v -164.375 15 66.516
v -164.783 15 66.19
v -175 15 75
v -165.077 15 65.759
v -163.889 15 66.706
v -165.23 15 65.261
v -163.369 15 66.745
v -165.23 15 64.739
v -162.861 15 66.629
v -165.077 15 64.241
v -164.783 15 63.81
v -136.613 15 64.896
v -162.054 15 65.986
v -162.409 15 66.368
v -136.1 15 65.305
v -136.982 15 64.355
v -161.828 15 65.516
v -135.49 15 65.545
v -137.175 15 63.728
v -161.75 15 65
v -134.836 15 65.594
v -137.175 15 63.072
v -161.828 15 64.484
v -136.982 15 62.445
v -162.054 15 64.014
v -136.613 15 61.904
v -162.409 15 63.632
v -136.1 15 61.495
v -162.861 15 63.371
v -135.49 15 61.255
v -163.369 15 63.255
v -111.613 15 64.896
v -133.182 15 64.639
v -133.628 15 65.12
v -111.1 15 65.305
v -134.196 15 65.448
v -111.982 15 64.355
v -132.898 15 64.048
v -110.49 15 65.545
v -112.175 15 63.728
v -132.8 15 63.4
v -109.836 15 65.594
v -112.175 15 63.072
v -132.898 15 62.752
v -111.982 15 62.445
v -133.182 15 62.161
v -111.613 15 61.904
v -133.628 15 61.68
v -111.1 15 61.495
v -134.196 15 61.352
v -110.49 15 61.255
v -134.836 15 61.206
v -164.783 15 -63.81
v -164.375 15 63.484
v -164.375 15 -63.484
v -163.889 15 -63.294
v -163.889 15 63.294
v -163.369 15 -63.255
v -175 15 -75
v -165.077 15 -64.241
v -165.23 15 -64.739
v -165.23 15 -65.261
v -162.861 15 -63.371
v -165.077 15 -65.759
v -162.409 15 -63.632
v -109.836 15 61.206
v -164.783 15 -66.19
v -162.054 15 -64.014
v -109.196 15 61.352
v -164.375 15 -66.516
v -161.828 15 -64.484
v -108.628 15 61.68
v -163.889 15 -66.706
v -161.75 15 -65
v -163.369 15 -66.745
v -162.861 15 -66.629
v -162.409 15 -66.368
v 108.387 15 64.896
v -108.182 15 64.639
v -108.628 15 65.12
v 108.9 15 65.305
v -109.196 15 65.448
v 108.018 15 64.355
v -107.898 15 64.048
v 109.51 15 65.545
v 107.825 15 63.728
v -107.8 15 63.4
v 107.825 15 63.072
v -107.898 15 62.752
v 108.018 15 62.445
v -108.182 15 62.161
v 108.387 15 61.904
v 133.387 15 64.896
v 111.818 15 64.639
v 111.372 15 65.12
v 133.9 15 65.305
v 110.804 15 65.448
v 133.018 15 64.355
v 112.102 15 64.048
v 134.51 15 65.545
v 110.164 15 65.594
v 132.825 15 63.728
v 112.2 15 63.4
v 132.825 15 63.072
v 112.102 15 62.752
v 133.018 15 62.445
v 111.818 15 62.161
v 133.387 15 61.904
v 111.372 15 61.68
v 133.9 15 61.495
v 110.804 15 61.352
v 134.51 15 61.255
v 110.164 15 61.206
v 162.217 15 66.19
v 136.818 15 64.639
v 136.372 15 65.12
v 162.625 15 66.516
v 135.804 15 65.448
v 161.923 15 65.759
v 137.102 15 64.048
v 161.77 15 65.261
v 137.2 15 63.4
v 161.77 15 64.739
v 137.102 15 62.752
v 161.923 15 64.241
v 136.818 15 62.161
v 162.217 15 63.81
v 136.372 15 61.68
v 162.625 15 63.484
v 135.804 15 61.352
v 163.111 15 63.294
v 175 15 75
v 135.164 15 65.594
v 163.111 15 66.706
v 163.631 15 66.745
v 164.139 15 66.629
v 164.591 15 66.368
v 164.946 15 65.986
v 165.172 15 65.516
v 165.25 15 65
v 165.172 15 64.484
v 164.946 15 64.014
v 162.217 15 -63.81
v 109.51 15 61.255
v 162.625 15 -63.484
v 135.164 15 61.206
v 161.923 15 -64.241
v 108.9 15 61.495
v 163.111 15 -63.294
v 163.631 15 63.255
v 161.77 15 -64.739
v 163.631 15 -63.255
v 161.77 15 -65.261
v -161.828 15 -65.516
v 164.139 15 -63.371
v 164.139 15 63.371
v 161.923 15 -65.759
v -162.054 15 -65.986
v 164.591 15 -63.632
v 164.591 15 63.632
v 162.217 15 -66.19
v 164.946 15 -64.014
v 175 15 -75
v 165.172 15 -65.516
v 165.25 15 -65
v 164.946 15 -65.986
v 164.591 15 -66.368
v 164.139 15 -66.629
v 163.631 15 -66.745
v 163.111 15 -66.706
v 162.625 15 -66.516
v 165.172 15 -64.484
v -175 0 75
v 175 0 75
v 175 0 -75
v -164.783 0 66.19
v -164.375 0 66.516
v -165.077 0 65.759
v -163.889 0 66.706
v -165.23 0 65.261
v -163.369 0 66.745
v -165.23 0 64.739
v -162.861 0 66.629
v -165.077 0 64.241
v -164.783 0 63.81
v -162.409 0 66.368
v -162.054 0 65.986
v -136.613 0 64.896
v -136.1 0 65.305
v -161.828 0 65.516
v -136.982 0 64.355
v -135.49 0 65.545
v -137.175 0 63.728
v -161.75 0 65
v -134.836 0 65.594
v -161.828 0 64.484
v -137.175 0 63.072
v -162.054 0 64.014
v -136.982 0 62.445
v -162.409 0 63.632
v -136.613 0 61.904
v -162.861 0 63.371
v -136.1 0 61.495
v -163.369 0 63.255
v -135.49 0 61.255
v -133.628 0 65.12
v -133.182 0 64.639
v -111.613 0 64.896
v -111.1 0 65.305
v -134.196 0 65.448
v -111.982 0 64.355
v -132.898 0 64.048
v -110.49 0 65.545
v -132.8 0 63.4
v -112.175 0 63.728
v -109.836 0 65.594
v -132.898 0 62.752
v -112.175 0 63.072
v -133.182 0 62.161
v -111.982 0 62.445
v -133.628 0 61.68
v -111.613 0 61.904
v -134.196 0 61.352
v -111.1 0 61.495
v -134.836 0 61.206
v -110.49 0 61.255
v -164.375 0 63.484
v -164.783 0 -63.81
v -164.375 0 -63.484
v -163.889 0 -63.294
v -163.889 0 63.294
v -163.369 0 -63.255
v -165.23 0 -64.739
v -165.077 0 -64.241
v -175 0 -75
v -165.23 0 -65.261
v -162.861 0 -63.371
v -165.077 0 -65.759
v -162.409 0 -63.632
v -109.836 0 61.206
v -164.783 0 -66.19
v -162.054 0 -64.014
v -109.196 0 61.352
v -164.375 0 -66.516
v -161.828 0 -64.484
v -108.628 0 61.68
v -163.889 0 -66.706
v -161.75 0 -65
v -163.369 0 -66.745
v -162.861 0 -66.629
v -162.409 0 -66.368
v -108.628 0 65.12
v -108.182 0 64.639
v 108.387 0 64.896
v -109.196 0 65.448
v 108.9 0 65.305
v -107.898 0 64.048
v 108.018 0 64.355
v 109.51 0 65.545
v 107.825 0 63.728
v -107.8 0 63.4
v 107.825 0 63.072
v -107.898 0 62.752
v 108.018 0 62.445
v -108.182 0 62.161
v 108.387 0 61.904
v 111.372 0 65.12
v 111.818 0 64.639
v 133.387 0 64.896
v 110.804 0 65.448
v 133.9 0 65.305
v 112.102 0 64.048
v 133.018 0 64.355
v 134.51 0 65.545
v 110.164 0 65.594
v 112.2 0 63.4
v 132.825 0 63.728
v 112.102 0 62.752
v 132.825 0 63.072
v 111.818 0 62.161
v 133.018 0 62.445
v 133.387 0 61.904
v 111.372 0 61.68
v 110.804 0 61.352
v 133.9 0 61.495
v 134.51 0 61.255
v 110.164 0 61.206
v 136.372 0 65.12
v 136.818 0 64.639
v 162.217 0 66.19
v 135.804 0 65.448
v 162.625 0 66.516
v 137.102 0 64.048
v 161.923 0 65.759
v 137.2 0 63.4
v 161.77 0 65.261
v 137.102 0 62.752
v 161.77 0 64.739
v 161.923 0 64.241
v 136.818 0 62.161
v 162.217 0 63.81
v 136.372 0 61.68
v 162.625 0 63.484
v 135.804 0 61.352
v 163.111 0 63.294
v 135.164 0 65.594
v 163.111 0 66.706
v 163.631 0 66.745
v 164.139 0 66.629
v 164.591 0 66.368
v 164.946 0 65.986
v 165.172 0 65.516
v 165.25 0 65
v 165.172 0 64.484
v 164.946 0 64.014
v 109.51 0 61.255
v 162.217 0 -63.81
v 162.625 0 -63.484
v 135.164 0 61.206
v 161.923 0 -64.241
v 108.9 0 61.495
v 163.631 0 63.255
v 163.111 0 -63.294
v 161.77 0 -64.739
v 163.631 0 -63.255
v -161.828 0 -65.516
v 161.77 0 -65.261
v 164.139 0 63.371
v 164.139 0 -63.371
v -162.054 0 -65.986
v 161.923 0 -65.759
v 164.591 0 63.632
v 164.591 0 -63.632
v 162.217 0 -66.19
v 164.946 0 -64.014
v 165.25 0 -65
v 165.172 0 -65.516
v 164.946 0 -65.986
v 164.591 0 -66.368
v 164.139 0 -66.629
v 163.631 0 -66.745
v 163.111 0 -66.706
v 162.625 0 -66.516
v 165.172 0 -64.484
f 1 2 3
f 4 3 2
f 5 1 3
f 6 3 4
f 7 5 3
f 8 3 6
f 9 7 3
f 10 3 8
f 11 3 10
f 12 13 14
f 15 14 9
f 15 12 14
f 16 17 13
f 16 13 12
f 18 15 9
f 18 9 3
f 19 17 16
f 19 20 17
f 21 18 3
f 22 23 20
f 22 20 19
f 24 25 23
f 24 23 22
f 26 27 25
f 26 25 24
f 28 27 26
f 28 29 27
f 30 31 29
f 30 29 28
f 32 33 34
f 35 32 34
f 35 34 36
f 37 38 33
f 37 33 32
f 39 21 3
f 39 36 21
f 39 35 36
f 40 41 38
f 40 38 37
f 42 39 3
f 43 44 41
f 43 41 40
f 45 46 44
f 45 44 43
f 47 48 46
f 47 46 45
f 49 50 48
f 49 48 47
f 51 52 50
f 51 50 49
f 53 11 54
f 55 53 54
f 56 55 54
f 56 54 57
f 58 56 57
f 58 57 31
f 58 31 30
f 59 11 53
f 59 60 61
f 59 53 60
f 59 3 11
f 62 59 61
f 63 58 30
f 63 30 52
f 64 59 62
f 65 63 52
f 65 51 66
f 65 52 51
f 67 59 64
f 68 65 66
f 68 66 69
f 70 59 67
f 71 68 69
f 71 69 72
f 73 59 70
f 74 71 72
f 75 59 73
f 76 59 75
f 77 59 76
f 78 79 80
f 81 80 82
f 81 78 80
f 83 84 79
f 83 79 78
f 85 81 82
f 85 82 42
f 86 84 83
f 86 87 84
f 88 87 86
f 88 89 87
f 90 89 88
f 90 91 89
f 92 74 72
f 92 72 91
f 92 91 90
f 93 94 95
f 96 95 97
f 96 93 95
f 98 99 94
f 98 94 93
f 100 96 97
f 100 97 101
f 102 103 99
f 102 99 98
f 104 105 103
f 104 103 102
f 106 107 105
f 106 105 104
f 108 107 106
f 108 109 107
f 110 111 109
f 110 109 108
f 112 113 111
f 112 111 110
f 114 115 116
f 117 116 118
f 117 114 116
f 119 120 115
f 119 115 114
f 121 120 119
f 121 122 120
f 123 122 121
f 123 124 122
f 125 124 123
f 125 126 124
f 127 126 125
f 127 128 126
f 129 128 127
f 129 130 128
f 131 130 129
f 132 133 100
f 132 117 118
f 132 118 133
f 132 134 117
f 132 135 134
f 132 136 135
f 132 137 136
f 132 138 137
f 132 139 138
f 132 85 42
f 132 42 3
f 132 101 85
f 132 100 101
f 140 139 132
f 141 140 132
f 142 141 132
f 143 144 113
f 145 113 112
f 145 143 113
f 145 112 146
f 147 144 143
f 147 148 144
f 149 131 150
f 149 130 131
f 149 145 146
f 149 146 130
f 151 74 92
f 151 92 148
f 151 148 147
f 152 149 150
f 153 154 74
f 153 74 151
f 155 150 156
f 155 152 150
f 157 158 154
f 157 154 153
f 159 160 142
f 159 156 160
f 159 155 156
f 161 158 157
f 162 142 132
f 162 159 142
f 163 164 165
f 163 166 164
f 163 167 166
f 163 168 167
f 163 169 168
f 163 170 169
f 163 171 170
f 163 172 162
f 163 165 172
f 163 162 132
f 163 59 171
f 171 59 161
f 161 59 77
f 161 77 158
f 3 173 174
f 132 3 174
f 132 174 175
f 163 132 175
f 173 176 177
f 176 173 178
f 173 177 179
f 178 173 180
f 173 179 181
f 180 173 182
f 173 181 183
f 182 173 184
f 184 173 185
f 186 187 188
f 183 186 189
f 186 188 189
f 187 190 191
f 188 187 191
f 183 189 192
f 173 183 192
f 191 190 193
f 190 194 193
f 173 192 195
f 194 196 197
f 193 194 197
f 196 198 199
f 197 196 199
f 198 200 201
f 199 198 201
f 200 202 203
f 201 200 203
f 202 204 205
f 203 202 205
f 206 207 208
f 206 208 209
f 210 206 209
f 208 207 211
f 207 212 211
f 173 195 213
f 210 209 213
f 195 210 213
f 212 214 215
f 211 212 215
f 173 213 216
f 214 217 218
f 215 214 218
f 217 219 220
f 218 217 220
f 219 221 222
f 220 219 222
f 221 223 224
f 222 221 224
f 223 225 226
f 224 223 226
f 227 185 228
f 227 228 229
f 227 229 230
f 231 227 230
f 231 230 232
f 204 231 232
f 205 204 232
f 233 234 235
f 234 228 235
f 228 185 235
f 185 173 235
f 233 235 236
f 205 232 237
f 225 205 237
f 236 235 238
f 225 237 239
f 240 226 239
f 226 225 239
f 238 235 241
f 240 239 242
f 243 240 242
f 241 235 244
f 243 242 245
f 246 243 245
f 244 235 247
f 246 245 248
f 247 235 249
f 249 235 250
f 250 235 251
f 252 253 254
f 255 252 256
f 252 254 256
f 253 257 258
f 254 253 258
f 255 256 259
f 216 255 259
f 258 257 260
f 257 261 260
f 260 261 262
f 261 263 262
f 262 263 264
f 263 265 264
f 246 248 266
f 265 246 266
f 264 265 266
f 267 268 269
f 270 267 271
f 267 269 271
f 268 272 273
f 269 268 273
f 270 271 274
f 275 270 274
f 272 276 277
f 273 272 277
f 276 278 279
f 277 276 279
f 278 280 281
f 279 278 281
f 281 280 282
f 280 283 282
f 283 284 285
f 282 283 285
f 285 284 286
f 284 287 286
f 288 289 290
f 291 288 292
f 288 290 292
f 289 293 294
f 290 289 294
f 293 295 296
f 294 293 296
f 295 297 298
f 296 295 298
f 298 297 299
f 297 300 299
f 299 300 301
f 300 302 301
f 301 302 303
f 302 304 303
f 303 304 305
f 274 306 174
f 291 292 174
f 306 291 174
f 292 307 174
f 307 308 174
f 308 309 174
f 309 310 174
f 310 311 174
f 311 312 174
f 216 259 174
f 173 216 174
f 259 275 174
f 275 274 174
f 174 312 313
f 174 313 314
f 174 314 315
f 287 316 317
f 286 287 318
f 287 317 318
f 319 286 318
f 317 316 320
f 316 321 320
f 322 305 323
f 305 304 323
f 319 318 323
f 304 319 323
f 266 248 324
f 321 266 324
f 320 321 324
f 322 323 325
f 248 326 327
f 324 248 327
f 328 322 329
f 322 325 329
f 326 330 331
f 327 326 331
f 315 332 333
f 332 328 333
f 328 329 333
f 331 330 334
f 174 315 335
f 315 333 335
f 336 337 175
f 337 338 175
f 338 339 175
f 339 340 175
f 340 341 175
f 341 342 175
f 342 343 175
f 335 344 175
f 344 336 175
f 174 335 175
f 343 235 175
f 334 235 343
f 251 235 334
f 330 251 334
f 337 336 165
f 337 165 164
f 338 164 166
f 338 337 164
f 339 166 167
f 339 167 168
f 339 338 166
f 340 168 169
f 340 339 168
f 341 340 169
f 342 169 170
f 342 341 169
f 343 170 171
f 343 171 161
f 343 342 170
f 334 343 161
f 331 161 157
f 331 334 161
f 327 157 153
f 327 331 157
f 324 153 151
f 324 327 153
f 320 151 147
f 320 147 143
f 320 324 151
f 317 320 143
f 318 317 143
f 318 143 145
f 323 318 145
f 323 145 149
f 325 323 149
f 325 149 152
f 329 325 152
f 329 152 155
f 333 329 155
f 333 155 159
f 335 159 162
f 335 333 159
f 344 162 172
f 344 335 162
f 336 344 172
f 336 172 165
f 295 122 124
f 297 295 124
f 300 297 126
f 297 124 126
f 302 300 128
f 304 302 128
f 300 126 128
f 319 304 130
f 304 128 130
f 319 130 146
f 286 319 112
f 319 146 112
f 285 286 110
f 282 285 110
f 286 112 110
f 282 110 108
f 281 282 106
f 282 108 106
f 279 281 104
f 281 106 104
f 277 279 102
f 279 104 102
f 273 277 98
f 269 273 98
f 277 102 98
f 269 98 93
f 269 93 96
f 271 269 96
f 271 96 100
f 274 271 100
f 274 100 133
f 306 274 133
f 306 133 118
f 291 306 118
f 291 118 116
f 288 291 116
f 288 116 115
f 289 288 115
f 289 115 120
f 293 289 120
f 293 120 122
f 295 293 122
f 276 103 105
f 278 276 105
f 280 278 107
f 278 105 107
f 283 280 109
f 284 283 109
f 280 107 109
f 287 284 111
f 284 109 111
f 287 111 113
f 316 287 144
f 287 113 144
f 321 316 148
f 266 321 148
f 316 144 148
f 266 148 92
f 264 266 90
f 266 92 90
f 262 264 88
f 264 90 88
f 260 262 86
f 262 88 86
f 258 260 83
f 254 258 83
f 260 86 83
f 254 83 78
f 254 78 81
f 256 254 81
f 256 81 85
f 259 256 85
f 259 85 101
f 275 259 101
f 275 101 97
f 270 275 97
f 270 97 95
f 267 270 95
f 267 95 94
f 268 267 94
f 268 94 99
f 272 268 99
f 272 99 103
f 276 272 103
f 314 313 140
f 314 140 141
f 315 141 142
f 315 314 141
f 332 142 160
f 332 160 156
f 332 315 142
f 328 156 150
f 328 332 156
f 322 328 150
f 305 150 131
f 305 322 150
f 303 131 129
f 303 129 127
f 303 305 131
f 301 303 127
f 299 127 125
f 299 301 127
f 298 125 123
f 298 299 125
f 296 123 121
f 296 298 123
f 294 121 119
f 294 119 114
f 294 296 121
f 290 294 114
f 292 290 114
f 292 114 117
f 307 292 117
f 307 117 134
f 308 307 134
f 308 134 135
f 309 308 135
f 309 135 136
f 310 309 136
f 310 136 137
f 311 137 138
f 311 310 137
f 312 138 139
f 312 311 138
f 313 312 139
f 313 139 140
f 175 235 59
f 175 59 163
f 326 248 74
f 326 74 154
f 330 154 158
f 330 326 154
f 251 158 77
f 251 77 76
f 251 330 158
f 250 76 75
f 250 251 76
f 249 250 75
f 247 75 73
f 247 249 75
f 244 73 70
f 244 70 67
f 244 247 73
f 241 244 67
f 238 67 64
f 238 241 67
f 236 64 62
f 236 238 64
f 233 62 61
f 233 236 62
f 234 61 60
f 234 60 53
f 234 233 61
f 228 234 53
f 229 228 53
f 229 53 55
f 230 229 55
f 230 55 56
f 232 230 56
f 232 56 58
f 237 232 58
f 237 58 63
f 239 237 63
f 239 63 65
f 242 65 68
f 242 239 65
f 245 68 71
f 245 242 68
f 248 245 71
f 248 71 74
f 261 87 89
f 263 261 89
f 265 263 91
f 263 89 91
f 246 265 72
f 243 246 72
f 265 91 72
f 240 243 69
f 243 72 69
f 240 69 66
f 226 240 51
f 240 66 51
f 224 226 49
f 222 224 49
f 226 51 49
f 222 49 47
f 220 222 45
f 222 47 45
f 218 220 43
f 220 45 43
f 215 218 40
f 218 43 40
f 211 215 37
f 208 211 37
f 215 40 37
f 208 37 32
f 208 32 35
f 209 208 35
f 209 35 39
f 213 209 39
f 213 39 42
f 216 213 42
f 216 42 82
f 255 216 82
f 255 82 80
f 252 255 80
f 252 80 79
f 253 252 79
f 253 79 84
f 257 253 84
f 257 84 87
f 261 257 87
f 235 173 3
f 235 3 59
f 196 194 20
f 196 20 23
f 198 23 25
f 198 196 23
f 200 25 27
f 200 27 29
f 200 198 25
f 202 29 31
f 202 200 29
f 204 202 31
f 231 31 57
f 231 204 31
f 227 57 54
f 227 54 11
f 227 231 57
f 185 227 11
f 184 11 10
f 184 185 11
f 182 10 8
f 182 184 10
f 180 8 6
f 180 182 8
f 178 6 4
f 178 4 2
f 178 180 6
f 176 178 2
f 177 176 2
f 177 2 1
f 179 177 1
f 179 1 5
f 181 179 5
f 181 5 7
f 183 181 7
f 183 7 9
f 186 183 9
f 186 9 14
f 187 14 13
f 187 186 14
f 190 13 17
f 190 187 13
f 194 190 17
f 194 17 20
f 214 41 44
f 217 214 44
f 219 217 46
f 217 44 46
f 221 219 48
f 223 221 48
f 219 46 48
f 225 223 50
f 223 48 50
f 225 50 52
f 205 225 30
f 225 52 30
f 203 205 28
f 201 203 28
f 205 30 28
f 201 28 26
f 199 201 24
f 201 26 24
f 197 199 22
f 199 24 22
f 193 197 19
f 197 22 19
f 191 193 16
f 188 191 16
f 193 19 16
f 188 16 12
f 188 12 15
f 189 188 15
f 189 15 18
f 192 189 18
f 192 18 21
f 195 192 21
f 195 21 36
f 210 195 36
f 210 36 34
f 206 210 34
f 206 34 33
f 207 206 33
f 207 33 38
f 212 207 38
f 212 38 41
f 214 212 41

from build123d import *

# Parameters (mm, degrees)
SKETCH1_W           = 350
SKETCH1_H           = 150
SKETCH1_R           = 1.75
BOSS_EXTRUDE1_DEPTH = 15
SKETCH2_R           = 2.2
CUT_EXTRUDE1_DEPTH  = 16


with BuildPart() as part:
    # Sketch1 → Boss-Extrude1 (new body)
    with BuildSketch(Plane(origin=(0, 0, 0), x_dir=(1, 0, 0), z_dir=(0, 1, 0))):
        Rectangle(SKETCH1_W, SKETCH1_H)
        with Locations((163.5, 65)):
            Circle(SKETCH1_R, mode=Mode.SUBTRACT)
        with Locations((163.5, -65)):
            Circle(SKETCH1_R, mode=Mode.SUBTRACT)
        with Locations((-163.5, -65)):
            Circle(SKETCH1_R, mode=Mode.SUBTRACT)
        with Locations((-163.5, 65)):
            Circle(SKETCH1_R, mode=Mode.SUBTRACT)
    extrude(amount=BOSS_EXTRUDE1_DEPTH)

    # Sketch2 → Cut-Extrude1 (cut, through all)
    with BuildSketch(Plane(origin=(0, 15, 0), x_dir=(1, 0, 0), z_dir=(0, 1, 0))):
        with Locations((-135, -63.4)):
            Circle(SKETCH2_R)
        with Locations((-110, -63.4)):
            Circle(SKETCH2_R)
        with Locations((135, -63.4)):
            Circle(SKETCH2_R)
        with Locations((110, -63.4)):
            Circle(SKETCH2_R)
    extrude(amount=-CUT_EXTRUDE1_DEPTH, mode=Mode.SUBTRACT)


solid = part.part
